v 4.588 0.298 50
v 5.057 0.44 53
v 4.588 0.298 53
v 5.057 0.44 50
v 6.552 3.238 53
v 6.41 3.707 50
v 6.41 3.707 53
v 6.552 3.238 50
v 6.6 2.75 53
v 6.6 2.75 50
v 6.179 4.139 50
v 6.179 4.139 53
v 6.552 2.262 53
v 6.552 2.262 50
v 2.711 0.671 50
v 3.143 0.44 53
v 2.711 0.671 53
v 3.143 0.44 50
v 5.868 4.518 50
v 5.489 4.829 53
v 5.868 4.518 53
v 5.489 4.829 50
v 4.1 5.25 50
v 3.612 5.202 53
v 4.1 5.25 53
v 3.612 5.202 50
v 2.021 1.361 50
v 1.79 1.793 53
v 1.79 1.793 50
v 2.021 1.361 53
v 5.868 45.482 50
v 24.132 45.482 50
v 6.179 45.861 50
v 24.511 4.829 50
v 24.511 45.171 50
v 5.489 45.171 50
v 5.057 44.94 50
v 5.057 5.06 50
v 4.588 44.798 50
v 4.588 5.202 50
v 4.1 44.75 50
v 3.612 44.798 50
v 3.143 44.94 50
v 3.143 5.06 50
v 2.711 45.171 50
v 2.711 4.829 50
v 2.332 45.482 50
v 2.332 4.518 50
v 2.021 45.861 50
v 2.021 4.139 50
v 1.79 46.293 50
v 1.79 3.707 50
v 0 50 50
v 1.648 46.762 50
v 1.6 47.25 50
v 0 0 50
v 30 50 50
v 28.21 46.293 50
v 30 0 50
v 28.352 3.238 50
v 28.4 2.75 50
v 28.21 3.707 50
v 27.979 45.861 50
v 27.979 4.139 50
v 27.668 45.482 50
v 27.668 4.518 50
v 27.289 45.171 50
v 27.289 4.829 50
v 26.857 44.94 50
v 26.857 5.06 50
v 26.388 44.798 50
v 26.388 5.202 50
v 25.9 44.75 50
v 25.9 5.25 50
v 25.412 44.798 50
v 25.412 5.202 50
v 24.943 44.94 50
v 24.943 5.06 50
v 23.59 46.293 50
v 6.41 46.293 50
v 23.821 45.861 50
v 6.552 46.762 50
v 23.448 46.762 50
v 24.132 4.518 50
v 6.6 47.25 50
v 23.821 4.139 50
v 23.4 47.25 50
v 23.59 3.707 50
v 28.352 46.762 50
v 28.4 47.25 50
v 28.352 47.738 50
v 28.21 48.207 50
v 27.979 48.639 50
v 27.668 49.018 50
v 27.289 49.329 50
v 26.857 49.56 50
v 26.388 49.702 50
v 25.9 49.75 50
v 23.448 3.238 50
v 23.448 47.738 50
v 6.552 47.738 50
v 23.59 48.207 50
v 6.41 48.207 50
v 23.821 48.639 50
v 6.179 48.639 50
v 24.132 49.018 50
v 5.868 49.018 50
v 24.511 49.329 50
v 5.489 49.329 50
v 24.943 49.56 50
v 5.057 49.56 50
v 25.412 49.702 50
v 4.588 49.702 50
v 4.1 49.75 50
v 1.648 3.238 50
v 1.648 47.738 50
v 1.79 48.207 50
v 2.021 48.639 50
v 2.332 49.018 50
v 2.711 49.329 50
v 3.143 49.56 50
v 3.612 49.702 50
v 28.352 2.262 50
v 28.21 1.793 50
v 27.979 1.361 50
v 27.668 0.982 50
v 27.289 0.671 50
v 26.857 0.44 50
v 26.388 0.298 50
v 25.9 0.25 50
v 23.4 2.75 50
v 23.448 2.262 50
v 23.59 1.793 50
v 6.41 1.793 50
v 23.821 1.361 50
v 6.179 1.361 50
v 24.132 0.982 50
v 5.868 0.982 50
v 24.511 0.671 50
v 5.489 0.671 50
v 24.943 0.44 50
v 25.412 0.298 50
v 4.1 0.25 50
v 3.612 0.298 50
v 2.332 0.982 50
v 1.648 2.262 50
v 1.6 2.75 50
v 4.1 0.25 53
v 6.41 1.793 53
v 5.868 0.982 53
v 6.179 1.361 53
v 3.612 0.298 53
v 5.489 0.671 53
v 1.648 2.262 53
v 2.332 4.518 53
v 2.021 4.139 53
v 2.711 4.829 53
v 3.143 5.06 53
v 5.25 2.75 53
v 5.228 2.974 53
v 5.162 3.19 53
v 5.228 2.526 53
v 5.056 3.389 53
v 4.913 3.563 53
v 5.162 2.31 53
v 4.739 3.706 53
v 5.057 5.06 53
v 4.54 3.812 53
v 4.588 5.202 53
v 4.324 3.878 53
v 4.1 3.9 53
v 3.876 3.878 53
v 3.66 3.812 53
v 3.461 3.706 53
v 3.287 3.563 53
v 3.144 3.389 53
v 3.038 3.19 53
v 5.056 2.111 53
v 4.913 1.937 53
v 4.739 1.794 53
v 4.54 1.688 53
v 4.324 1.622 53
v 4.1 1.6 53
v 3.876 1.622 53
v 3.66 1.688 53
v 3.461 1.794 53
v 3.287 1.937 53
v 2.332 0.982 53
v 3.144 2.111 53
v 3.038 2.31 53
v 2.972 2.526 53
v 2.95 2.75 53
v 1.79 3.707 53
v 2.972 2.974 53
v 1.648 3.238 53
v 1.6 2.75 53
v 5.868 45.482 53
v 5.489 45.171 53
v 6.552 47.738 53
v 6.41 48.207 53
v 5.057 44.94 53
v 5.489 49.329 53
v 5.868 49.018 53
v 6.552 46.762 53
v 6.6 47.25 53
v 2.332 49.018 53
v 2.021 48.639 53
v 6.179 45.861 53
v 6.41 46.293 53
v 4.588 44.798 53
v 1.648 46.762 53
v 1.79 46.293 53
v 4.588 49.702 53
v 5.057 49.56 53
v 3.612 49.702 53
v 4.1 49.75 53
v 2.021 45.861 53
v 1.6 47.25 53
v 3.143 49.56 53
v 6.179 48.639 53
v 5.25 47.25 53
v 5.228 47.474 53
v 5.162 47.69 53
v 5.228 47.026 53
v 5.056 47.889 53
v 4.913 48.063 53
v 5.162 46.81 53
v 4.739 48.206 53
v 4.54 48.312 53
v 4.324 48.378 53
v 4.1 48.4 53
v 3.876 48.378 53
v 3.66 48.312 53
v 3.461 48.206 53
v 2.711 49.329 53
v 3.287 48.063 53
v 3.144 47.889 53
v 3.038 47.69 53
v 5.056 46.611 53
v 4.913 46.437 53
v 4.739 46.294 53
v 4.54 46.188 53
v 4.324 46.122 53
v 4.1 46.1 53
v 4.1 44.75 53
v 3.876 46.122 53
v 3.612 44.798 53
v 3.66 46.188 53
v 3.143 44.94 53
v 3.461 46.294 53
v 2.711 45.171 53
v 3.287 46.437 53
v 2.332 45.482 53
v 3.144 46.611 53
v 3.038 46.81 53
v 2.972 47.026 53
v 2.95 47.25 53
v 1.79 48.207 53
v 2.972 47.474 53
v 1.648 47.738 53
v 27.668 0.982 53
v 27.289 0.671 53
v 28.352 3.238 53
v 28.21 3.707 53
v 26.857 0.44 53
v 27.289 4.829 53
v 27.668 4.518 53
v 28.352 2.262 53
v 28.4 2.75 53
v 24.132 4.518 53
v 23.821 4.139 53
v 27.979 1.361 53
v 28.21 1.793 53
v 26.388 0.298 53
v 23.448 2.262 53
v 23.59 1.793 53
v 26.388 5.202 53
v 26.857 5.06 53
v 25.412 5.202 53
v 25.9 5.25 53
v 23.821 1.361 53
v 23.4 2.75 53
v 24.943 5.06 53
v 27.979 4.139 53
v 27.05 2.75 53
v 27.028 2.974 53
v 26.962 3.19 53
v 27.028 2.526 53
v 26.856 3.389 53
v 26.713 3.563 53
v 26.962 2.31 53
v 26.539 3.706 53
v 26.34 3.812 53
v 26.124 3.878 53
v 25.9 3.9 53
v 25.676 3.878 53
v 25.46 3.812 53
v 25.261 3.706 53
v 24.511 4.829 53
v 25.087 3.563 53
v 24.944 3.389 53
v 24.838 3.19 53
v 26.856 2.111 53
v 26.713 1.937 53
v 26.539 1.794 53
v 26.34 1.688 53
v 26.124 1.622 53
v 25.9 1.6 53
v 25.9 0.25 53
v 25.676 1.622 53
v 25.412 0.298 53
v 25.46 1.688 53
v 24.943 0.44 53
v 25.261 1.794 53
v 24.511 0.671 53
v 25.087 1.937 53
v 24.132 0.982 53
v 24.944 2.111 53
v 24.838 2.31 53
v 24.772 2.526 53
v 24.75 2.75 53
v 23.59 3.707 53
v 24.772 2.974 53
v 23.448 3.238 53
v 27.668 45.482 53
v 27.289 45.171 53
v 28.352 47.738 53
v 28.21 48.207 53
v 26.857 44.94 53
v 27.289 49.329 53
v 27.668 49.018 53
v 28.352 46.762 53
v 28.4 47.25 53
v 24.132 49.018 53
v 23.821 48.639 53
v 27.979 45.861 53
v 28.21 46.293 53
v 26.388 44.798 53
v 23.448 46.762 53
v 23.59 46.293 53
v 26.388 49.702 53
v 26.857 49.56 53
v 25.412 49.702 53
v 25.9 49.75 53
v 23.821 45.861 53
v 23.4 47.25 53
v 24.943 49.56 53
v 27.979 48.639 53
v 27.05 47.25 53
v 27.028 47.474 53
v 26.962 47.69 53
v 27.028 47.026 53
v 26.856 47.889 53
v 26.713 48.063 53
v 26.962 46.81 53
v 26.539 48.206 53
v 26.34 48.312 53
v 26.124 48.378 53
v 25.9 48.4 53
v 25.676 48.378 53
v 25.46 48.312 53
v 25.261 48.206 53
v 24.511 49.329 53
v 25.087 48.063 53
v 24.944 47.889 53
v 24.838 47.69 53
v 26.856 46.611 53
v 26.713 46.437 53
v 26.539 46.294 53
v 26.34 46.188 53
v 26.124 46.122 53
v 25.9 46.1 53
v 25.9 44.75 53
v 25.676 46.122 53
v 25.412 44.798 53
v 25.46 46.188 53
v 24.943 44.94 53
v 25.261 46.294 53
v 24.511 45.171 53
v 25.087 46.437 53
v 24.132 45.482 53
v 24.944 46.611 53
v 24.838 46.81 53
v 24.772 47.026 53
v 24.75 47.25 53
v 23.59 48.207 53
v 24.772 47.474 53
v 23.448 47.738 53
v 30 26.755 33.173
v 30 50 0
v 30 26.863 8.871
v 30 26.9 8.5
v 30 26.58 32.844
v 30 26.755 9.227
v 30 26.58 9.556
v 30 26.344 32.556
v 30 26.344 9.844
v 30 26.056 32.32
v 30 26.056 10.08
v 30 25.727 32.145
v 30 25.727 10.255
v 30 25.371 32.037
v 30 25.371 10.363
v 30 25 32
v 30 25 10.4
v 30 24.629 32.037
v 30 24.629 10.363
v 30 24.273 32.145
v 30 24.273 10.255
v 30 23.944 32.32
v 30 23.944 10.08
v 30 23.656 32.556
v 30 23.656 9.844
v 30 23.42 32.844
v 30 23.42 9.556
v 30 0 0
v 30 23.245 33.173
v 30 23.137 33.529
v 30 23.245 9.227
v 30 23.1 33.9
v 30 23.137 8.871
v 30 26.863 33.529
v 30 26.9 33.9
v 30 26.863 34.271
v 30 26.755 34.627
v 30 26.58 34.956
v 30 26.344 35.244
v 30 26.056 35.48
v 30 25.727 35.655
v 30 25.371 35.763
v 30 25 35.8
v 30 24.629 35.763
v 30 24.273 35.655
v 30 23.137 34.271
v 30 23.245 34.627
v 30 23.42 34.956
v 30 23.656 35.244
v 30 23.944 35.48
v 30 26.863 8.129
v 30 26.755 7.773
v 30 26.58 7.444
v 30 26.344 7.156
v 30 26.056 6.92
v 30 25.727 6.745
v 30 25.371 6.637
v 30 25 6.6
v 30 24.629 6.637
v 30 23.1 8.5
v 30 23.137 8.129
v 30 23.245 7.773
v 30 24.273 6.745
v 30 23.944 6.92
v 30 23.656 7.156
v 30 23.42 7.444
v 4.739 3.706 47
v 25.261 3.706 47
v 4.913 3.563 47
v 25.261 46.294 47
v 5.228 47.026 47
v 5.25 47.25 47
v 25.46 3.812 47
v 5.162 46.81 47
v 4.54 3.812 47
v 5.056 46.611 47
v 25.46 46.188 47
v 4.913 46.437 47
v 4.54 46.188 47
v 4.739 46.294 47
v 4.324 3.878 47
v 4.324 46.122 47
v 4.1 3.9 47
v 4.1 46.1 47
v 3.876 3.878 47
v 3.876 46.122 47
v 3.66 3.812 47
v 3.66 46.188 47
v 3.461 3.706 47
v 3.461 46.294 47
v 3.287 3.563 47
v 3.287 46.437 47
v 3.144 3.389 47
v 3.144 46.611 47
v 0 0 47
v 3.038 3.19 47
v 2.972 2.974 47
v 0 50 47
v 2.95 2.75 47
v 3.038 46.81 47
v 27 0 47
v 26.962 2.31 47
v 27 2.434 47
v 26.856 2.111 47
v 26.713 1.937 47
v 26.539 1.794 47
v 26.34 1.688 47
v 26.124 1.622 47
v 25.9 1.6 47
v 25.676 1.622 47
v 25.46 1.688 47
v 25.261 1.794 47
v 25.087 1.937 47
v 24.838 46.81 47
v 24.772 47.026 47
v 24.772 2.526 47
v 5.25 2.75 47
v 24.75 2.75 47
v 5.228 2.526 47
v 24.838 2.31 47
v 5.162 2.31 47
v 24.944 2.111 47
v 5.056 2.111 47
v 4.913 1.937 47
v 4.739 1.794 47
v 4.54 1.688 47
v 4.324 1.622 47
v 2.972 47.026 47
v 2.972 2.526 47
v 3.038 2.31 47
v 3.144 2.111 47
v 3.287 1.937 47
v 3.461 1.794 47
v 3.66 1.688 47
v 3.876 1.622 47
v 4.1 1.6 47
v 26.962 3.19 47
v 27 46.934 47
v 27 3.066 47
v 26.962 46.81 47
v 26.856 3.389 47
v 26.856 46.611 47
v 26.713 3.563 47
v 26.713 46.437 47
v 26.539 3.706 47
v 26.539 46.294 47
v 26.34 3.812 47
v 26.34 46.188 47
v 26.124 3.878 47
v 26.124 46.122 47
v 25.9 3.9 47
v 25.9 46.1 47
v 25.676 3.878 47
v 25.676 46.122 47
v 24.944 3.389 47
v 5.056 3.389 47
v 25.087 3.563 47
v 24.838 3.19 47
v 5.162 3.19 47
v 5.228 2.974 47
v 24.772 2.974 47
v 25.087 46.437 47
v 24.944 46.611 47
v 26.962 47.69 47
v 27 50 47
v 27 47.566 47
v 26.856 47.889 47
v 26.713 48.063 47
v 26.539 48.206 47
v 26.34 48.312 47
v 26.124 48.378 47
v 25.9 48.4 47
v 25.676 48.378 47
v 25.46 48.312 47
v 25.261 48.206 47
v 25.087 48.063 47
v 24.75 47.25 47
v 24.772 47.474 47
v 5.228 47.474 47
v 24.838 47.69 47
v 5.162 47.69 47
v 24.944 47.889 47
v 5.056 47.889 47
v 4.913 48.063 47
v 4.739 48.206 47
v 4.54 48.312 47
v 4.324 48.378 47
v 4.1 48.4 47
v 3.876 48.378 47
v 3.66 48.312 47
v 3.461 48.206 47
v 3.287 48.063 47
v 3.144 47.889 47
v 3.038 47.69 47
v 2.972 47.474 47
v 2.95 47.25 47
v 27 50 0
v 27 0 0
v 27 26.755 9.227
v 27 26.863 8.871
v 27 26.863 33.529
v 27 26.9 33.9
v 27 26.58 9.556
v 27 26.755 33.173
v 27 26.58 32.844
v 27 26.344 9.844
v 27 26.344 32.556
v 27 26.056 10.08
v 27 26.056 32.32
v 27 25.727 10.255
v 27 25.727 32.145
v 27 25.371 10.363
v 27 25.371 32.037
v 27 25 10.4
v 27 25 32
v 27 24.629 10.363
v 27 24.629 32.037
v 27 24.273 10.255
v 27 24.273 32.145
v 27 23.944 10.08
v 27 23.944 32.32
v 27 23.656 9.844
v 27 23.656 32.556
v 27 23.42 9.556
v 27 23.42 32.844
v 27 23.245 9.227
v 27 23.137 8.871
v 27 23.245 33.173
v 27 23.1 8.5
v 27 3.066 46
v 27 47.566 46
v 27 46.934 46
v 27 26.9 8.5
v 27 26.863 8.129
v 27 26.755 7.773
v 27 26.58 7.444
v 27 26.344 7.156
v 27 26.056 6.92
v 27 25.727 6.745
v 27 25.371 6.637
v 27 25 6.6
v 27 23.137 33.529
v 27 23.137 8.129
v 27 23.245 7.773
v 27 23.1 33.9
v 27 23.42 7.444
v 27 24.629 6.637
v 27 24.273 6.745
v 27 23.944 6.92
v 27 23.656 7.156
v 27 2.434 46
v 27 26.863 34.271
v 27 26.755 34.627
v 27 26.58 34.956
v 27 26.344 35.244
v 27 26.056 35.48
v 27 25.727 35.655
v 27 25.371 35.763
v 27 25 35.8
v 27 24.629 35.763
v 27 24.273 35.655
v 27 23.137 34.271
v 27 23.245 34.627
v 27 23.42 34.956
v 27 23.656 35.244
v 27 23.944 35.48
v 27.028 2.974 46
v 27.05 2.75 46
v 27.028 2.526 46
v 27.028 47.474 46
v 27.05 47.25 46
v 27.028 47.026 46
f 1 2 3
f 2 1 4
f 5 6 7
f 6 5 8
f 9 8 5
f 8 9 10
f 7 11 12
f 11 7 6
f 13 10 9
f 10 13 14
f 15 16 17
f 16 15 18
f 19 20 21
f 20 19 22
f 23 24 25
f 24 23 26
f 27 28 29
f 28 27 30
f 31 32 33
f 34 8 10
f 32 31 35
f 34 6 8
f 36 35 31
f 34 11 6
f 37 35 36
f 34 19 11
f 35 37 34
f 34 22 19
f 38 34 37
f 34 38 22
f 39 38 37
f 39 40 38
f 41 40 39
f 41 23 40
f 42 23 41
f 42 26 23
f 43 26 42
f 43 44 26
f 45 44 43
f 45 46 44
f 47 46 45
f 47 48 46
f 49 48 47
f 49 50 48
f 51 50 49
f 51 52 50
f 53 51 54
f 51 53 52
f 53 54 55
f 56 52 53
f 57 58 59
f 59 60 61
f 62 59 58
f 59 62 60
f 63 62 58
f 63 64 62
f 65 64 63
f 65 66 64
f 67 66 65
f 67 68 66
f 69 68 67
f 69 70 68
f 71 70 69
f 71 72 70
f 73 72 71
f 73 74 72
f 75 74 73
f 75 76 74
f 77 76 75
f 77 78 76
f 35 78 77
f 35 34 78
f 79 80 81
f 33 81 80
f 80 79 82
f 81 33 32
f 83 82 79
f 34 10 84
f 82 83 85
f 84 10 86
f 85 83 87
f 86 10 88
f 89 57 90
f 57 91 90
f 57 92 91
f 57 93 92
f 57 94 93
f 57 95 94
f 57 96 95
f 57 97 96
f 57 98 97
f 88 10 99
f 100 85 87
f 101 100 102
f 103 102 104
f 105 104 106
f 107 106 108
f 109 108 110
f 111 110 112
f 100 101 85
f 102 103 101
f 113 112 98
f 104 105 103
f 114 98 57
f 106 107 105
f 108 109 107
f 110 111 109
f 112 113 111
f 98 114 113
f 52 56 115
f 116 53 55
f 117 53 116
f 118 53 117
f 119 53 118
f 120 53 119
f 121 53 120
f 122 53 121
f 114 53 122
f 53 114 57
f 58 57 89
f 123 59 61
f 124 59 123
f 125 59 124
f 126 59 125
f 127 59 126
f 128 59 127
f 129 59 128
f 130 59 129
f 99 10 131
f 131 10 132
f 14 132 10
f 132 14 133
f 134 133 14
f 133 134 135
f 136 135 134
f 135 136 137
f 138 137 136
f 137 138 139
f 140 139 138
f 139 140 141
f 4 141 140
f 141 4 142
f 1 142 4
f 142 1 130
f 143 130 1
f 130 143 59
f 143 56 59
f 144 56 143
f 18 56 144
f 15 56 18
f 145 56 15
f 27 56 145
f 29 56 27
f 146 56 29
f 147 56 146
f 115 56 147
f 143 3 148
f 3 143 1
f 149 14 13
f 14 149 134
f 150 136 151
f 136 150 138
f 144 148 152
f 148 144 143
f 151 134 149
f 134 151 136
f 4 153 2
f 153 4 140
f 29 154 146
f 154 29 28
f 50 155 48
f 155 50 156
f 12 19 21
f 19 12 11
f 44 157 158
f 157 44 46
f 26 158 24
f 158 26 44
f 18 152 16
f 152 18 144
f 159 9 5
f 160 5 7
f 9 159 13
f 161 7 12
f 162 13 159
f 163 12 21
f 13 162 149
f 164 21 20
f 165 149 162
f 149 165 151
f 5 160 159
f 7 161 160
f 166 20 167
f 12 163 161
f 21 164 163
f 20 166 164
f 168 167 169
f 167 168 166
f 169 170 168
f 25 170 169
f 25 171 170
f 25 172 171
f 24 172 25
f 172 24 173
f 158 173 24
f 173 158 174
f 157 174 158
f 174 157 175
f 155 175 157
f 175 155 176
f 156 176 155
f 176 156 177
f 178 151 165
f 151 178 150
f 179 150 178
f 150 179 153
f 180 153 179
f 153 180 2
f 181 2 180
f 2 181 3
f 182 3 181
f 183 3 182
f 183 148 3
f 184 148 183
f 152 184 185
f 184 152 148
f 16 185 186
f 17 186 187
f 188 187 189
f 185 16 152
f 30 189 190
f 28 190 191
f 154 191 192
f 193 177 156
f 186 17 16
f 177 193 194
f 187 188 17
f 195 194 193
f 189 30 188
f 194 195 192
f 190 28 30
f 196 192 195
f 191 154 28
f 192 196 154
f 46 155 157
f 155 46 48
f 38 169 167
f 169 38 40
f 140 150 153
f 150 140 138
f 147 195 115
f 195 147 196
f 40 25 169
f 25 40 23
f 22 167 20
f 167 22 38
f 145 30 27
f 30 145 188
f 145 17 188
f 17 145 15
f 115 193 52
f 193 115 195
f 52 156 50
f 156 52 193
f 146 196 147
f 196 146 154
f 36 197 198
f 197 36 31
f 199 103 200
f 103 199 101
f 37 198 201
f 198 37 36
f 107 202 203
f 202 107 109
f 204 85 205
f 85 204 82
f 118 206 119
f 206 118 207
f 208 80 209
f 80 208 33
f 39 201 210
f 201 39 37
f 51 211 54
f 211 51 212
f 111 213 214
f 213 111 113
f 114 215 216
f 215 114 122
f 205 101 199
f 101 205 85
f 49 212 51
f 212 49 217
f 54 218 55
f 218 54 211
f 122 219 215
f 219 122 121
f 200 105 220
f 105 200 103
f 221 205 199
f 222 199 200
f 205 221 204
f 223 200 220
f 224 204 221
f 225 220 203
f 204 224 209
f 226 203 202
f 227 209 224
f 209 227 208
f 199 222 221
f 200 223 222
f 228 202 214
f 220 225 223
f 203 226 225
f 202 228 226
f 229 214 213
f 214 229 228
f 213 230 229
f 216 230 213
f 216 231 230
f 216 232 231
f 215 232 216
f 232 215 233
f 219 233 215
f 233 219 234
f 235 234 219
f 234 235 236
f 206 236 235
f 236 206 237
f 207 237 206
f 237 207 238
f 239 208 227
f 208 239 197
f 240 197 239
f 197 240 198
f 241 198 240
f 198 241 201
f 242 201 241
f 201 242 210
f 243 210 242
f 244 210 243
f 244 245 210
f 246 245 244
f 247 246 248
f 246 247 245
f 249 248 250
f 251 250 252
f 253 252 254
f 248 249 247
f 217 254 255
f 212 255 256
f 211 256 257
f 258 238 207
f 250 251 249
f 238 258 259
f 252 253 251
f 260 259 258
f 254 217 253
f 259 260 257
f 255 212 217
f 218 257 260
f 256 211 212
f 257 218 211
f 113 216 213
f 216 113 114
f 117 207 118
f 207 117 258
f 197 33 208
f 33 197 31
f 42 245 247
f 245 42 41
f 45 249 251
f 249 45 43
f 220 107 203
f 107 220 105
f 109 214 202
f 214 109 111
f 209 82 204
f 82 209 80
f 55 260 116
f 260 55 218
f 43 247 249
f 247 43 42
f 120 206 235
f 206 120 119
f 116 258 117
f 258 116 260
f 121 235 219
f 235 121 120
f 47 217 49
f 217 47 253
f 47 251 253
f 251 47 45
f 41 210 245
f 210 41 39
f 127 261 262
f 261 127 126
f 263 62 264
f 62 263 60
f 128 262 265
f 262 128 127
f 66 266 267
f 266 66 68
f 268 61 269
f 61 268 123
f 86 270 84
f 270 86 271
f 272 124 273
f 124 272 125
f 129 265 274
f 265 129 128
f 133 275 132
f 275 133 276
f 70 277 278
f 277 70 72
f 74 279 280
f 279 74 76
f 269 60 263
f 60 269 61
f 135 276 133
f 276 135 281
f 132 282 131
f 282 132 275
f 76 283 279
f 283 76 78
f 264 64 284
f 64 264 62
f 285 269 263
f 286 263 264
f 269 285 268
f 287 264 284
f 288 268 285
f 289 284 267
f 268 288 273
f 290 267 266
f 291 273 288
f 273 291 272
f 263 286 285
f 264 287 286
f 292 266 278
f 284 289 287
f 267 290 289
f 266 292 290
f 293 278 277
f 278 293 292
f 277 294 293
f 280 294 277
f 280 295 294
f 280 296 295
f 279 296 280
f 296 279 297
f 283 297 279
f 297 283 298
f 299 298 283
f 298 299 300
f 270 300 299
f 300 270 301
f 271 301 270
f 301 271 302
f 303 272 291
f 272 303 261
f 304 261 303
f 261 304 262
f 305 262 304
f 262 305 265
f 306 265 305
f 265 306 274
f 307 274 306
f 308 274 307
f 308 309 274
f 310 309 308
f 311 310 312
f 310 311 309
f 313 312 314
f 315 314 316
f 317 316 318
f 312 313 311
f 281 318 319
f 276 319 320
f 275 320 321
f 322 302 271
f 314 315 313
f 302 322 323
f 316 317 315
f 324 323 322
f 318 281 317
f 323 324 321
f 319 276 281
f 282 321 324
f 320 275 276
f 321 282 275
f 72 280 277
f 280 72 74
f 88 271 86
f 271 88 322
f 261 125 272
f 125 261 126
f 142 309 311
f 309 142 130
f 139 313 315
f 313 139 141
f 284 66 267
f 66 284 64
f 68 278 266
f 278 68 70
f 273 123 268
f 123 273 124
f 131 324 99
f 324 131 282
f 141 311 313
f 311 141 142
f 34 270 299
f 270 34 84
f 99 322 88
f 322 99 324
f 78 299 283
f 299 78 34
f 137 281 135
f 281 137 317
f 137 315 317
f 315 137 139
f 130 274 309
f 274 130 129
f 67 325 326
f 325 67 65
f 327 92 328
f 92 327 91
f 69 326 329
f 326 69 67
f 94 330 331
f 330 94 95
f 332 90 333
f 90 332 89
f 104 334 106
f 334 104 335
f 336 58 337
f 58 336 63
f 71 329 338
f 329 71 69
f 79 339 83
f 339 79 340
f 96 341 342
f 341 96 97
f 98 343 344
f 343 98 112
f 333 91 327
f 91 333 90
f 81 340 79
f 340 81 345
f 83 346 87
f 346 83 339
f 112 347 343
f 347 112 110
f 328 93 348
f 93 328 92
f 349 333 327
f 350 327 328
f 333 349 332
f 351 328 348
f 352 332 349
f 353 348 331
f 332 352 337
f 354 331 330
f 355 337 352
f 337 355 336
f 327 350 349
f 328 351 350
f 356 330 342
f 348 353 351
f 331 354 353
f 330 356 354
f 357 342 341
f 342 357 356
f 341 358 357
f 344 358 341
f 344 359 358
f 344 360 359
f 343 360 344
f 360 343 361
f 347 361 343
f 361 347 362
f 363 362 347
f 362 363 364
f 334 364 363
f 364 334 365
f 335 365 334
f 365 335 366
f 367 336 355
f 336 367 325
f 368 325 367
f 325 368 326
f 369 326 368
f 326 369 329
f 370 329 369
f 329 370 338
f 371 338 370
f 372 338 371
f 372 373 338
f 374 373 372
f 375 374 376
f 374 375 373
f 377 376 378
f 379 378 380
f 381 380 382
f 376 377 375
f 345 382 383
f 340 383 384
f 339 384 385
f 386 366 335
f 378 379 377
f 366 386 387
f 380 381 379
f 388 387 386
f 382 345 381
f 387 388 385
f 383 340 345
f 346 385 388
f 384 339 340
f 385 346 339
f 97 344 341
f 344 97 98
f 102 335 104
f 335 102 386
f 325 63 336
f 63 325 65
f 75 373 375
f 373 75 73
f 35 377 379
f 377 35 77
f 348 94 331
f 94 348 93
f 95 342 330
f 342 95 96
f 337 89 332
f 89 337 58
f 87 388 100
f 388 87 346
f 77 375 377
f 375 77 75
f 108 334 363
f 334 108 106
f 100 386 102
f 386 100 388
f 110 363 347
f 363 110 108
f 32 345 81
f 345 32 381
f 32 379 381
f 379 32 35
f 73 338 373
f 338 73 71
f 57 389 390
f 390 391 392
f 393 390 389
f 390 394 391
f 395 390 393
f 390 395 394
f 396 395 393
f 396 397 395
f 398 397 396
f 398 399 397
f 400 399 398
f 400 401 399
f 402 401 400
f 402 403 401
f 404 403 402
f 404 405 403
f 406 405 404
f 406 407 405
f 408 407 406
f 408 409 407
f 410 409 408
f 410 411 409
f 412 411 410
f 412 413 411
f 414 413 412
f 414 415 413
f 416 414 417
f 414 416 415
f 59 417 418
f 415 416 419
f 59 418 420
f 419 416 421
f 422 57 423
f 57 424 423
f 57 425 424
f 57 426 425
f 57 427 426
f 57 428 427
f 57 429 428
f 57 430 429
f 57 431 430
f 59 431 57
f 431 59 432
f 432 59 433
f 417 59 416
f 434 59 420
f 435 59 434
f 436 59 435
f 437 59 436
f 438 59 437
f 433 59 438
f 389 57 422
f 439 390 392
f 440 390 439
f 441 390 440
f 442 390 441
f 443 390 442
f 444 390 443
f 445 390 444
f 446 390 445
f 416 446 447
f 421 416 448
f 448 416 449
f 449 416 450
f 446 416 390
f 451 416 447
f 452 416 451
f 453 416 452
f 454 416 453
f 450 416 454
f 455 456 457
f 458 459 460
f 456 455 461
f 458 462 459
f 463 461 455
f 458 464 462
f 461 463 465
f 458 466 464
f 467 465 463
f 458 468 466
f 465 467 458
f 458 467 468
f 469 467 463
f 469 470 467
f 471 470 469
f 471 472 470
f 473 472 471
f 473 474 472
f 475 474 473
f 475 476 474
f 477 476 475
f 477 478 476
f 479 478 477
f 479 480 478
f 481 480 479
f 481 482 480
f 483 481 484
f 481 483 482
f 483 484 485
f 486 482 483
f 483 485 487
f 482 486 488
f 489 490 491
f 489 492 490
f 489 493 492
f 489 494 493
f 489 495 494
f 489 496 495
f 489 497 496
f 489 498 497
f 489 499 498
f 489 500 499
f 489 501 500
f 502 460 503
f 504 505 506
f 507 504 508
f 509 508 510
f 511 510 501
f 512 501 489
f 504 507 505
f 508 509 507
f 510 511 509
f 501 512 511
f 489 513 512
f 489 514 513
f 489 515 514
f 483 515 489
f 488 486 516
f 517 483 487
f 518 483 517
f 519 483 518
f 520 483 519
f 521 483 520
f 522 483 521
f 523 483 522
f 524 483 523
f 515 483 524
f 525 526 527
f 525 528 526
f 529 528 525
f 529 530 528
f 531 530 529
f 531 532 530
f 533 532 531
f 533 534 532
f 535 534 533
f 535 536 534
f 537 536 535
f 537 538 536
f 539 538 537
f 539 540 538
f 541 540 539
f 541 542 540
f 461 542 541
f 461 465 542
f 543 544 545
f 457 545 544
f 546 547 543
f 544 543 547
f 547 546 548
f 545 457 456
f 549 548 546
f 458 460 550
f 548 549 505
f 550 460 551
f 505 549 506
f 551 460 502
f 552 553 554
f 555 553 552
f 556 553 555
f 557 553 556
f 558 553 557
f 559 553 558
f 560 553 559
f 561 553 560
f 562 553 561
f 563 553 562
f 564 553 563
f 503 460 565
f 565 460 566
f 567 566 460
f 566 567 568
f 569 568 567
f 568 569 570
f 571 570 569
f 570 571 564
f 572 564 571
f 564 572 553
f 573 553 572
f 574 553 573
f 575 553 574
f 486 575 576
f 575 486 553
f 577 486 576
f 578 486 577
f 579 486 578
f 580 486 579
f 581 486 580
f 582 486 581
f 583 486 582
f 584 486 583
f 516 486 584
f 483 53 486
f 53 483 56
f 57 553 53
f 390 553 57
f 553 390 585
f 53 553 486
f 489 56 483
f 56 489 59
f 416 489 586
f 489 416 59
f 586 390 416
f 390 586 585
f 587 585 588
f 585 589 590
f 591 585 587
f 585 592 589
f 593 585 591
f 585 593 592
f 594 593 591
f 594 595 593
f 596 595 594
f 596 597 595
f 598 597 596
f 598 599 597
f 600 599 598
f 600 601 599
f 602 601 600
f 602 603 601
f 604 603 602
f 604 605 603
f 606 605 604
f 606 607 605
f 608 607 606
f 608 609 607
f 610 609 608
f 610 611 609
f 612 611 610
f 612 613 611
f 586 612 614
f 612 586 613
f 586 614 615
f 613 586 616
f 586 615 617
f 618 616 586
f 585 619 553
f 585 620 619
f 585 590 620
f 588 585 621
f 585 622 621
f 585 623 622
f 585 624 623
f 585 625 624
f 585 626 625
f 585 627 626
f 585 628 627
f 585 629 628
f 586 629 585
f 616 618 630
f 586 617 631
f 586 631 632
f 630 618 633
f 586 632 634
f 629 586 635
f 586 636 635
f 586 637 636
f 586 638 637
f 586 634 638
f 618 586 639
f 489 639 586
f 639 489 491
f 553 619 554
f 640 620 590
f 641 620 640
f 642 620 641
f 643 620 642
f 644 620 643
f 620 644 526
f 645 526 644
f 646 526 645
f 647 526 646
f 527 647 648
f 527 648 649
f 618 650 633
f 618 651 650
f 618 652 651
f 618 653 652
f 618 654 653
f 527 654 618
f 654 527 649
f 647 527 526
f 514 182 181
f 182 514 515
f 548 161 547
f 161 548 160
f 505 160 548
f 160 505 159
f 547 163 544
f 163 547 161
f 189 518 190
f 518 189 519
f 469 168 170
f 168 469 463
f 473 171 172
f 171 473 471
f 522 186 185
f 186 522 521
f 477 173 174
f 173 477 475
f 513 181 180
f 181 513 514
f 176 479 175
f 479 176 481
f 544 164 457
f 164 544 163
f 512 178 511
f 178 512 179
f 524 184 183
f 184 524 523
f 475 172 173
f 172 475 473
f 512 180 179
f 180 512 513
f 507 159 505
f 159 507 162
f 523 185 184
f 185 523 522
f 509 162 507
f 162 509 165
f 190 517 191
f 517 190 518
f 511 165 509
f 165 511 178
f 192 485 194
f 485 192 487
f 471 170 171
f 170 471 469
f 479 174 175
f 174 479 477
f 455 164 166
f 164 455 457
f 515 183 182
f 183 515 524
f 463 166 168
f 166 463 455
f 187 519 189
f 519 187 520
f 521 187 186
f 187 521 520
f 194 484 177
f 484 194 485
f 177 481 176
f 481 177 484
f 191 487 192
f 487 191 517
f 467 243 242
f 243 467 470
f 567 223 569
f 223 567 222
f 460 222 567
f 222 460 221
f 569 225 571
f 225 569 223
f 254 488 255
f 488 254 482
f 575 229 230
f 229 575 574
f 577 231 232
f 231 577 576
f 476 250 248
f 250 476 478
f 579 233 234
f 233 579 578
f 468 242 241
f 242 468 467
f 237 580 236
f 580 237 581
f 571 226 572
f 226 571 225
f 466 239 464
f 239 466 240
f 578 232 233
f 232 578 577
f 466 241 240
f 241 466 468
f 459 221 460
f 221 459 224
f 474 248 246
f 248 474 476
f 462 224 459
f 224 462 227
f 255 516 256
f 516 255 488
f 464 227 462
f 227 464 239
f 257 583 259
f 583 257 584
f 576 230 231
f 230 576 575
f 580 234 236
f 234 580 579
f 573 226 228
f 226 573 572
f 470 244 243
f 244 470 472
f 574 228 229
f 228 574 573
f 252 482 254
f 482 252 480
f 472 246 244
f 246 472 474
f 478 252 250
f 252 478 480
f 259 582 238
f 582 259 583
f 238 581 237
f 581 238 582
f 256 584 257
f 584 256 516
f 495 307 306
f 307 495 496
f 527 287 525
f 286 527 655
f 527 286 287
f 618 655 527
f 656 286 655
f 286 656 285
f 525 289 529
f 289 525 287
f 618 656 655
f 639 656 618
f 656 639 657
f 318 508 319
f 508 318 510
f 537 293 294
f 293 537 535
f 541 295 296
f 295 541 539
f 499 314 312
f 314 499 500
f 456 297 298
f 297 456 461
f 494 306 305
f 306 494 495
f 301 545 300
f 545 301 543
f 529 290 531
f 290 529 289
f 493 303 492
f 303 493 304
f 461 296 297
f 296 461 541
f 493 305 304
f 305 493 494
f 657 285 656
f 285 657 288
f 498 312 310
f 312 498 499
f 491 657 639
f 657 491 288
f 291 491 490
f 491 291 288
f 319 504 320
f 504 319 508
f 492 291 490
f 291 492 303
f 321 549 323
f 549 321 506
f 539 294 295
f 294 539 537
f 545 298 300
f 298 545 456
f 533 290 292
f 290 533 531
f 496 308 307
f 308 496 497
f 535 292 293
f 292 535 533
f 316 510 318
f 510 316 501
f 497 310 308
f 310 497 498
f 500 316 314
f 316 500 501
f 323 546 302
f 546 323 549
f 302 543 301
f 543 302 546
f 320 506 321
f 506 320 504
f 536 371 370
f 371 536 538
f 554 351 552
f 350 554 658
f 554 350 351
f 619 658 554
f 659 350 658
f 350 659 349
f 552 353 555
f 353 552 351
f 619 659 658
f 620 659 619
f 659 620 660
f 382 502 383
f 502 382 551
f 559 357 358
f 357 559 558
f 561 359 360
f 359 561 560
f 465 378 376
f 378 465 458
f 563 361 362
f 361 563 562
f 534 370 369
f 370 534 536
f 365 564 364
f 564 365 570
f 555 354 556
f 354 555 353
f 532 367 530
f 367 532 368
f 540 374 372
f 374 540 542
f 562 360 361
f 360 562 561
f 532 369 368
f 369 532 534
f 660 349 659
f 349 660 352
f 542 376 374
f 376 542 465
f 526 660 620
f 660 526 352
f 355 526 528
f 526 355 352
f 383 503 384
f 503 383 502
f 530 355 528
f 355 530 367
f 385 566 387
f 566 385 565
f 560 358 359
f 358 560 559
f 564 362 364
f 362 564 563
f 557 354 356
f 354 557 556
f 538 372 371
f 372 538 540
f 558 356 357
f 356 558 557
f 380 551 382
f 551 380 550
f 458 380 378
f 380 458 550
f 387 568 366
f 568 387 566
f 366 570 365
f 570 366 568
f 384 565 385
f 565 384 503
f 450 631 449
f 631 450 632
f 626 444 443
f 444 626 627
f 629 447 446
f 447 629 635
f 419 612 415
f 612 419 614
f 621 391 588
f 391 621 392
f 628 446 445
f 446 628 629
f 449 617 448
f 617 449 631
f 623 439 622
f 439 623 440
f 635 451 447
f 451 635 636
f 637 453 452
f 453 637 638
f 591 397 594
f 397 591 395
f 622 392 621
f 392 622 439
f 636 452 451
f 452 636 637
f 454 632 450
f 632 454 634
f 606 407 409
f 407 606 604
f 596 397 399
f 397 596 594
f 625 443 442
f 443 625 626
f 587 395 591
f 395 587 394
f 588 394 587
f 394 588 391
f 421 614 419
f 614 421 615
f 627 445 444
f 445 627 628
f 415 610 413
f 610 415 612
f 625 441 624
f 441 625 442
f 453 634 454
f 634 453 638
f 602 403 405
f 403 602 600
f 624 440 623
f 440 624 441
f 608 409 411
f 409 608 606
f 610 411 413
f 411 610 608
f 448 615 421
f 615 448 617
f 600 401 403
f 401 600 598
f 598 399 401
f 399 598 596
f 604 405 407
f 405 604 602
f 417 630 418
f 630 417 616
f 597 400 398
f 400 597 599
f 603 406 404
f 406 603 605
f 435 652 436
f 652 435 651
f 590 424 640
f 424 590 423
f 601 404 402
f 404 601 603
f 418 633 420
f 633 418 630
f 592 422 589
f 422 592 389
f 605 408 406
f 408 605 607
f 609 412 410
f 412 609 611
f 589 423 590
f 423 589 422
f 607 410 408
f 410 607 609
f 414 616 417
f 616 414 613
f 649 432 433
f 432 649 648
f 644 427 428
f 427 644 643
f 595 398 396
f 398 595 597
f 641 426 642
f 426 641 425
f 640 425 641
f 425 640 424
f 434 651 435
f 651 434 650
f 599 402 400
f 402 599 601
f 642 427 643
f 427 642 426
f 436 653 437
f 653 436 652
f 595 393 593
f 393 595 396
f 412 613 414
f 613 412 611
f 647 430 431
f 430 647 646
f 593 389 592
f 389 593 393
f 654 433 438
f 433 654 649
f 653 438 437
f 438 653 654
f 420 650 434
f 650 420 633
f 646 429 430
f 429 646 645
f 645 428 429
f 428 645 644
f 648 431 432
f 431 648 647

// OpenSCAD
// TritonECU — L bracket
// A right-angle bracket. A module bolts down onto the SHORT (top) leg through
// four holes on Ø5 x 3 standoffs; the TALL leg is the upright, and carries a
// pair of Ø3.5 holes on its midline that fix the bracket to whatever it hangs
// on. Built from the hand drawing of 2026-09-20.
//
//   render one part at a time:  part = "bracket"
//
//              leg_x 30
//     |<--------------------->|
//     +-----------------------+   ---
//     |  I                 I  | |  t   <- short leg, four standoffs on TOP
//     +--------------------+--+   ---
//                          |##|
//                          |##|
//                          |##|
//                  leg_z   |##|  50     <- tall leg, t thick
//                          |o#|             o = the Ø3.5 pair, on the midline
//                          |##|                 of the 50 deep face
//                          |o#|
//                          +--+   ---
//
//   Depth of both legs: 50. Overall 30 x 50 x 50 (53 to the standoff tips).

part = "bracket";

/* Tessellation. Chord error is r*(1-cos(180/n)); a 2 mm hole at fn 32 is off by
   0.0024 mm, three orders below what the printer resolves. Holes are the only
   curved feature, so there is nothing to economise on. */
$fn     = 32;
hole_fn = 32;

/* ---------------------------------------------------------------------------
   FROM THE DRAWING — every number here is dimensioned on the sketch
   --------------------------------------------------------------------------- */
leg_x   = 30.0;  // short leg: outer tip to the OUTER face of the tall leg.
                 // DRAWN 25.8 — raised to 30 on 2026-09-20 because the pattern
                 // was then 23.8 and left 1 mm to each edge. The pattern has
                 // since come down to 21.8, which 25.8 would ALMOST take (2.0
                 // to each centre, boss overhanging 0.5). Left at 30: it is
                 // what makes the nut window below possible. See README.
leg_z   = 50.0;  // OVERALL height: top face of the short leg to the free end
deep    = 50.0;  // both legs, the depth of the extrusion

top_dx  = 21.8;  // the four top holes, centre to centre ACROSS the short leg.
                 // DRAWN 23.8 — corrected off the module on 2026-09-20, the
                 // pattern is 2 mm narrower than the sketch said.
top_dy  = 44.5;  // the four top holes, centre to centre ALONG the 50
top_d   =  2.0;  // "2 mm holes in the centre of the standoffs"

side_d  =  3.5;  // the pair in the tall leg
side_dz = 25.4;  // centre to centre, up the leg
side_z0 =  8.5;  // LOWER centre, up from the free end

/* ---------------------------------------------------------------------------
   NOT ON THE DRAWING — decisions, change them freely
   --------------------------------------------------------------------------- */

/* Plate and wall thickness. The drawing shows a ribbon of constant thickness
   but never says how thick. 3 mm, the same as hardware/psu-platform. The tall
   leg is the loaded member: as a 50 x 3 plate its section modulus is b*t^2/6 =
   75 mm^3, and a load in the middle of the short leg acts at 15 mm, so at a
   conservative 20 MPa for printed PETG it takes 100 N — about 10 kg. Height
   does not enter that; a vertical load's moment at the root is set by the
   offset, not by how tall the upright is. */
t         = 3.0;

/* Printed bores come out undersize by 0.2-0.4 mm on diameter — the first layer
   of the bore squashes inward. Both hole families are modelled OVERSIZE by this
   so they finish on their nominal: 2.0 -> 2.30, 3.5 -> 3.80. Set it to 0 if you
   would rather model nominal and drill. */
hole_comp = 0.30;

/* Standoffs on the four top holes, so the module sits clear of the plate — the
   usual reason being solder tails under its board. HEIGHT is the defining
   dimension: "3 mm standoff" means 3 mm of lift, not 3 mm of diameter. Ø5 round
   a Ø2.3 bore leaves a 1.35 mm wall; Ø3 would leave 0.35, under two extrusion
   widths, and would neither print nor hold. */
standoff   = true;
standoff_h = 3.0;
standoff_d = 5.0;

/* Hole pattern origins — the centre of the hole nearest the origin. Both
   default to the pattern CENTRED in the face, which is what the sketch shows to
   the accuracy a sketch has. If the real module's pattern is not centred, set
   these and nothing else changes. */
top_x0    = (leg_x - top_dx) / 2;   // 3.10
top_y0    = (deep  - top_dy) / 2;   // 2.75
side_y    = deep / 2;               // 25.00 — "the midline of the longer leg"

/* Optional corner ribs. OFF by default: the drawing has none and the upright
   does not need them (see the 10 kg above). Turn them on if the load is ever
   sideways rather than down — the case a flat plate is poor at. */
gusset    = false;
gusset_n  = 2;      // ribs, spread along the 50
gusset_t  = 2.4;    // 3 perimeters at 0.4 mm line width, solid
gusset_l  = 12;     // how far each rib reaches along each leg

/* ---------------------------------------------------------------------------
   Geometry
   --------------------------------------------------------------------------- */
top_r  = (top_d  + hole_comp) / 2;
side_r = (side_d + hole_comp) / 2;
wall_x = leg_x - t;              // 27.00 — inner face of the tall leg
top_z  = leg_z - t;              // 47.00 — underside of the short leg

module ribs() {
    // A right triangle in X-Z, extruded along Y, repeated along the depth.
    for (i = [0 : gusset_n - 1])
        translate([wall_x, deep * (i + 0.5) / gusset_n + gusset_t / 2, top_z])
            rotate([90, 0, 0])
                linear_extrude(gusset_t)
                    polygon([[0, 0], [-gusset_l, 0], [0, -gusset_l]]);
}

module bracket() {
    difference() {
        union() {
            // short leg — overlaps the upright, so the union is solid rather
            // than a pair of coincident faces
            translate([0, 0, top_z])     cube([leg_x, deep, t]);
            // tall leg, full height: it has to reach the top face, or its joint
            // to the short leg is a line of zero area
            translate([wall_x, 0, 0])    cube([t, deep, leg_z]);

            // standoffs, on TOP of the short leg, bored through below
            if (standoff)
                for (i = [0, 1], j = [0, 1])
                    translate([top_x0 + i * top_dx, top_y0 + j * top_dy, leg_z])
                        cylinder(h = standoff_h, d = standoff_d, $fn = hole_fn);

            if (gusset) ribs();
        }
        // the four 2 mm bores — through the short leg AND any standoff on it
        for (i = [0, 1], j = [0, 1])
            translate([top_x0 + i * top_dx, top_y0 + j * top_dy, top_z - 1])
                cylinder(h = t + (standoff ? standoff_h : 0) + 2, r = top_r,
                         $fn = hole_fn);

        // the Ø3.5 pair — through the tall leg, on its midline, axis along X
        for (k = [0, 1])
            translate([wall_x - 1, side_y, side_z0 + k * side_dz])
                rotate([0, 90, 0])
                    cylinder(h = t + 2, r = side_r, $fn = hole_fn);
    }
}

if (part == "bracket") bracket();

/* ---------------------------------------------------------------------------
   Checks — these print on every render, so they follow the parameters rather
   than the README
   --------------------------------------------------------------------------- */
echo(str("outside              ", leg_x, " x ", deep, " x ", leg_z, " mm"));
echo(str("short leg (platform) ", leg_x, " x ", deep, ", the four top holes"));
echo(str("tall leg  (upright)  ", leg_z, " x ", deep, ", t = ", t,
         ", inner face at x ", wall_x));
echo(str("TOP holes  modelled dia ", top_d + hole_comp, "  (", top_d,
         " nominal + ", hole_comp, " print compensation)"));
echo(str("  centres  x       ", top_x0, " and ", top_x0 + top_dx));
echo(str("  centres  y       ", top_y0, " and ", top_y0 + top_dy));
echo(str("  plate to the tip     ", top_x0 - top_r, " mm"));
echo(str("  plate in y           ", top_y0 - top_r, " mm"));
echo(str("SIDE holes modelled dia ", side_d + hole_comp, "  (", side_d,
         " nominal + ", hole_comp, ")"));
echo(str("  centres  z       ", side_z0, " and ", side_z0 + side_dz,
         "  up from the free end,  y ", side_y, " (midline)"));
echo(str("  plate below the lower  ", side_z0 - side_r, " mm"));
echo(str("  plate above the upper  ", top_z - (side_z0 + side_dz + side_r),
         " mm to the short leg's underside"));
echo(str("  plate either side      ", side_y - side_r, " mm"));
nut_af   = 3.8;                       // M2 nut / head across the flats
nut_x0   = wall_x - nut_af/2 - top_dx;   // largest top_x0 that clears the nut
boss_x0  = standoff_d/2;                 // smallest that keeps the boss on plate
echo(str("INBOARD top bore vs the upright's inner face (x ", wall_x, "): centre ",
         wall_x - (top_x0 + top_dx), " mm outboard, bore reaches ",
         (top_x0 + top_dx + top_r) - wall_x,
         " mm into the upright's plan area"));
echo(str("  a ", nut_af, " nut under the inboard pair needs top_x0 <= ", nut_x0,
         ";  a ", standoff_d, " boss on plate needs top_x0 >= ", boss_x0));
echo(str("  window ", (nut_x0 >= boss_x0)
           ? str(boss_x0, " .. ", nut_x0, ",  top_x0 is ", top_x0, " — ",
                 (top_x0 <= nut_x0 && top_x0 >= boss_x0)
                   ? "INSIDE it, an ordinary nut fits all four"
                   : "OUTSIDE it: centring the pattern costs the nut under the inboard pair. Set top_x0 into the window, or tap the plate.")
           : "EMPTY at this pattern — tap the plate instead, see README"));
if (standoff) {
    echo(str("standoffs             4 x ", standoff_d, " dia x ", standoff_h,
             " tall, on the short leg's TOP face"));
    echo(str("  wall around bore    ", (standoff_d - (top_d + hole_comp)) / 2,
             " mm",
             ((standoff_d - (top_d + hole_comp)) / 2 < 0.8)
               ? "  <-- UNDER 2 extrusion widths, raise standoff_d" : "  (ok)"));
    echo(str("  boss to the tip     ", top_x0 - standoff_d / 2, " mm",
             (top_x0 - standoff_d / 2 < 0) ? "  <-- OVERHANGS the edge" : ""));
    echo(str("  boss to the y edge  ", top_y0 - standoff_d / 2, " mm",
             (top_y0 - standoff_d / 2 < 0) ? "  <-- OVERHANGS the edge" : ""));
    echo(str("  thread stack        ", t + standoff_h,
             " mm of plate + standoff — ", (t + standoff_h) / top_d,
             " diameters of M2 if tapped"));
    echo(str("  overall height      ", leg_z + standoff_h,
             " mm to the standoff tips (part itself is still ", leg_z, ")"));
}
echo(str("bed footprint, printed on end  ", leg_x, " x ", leg_z,
         "  and ", deep, " tall"));
